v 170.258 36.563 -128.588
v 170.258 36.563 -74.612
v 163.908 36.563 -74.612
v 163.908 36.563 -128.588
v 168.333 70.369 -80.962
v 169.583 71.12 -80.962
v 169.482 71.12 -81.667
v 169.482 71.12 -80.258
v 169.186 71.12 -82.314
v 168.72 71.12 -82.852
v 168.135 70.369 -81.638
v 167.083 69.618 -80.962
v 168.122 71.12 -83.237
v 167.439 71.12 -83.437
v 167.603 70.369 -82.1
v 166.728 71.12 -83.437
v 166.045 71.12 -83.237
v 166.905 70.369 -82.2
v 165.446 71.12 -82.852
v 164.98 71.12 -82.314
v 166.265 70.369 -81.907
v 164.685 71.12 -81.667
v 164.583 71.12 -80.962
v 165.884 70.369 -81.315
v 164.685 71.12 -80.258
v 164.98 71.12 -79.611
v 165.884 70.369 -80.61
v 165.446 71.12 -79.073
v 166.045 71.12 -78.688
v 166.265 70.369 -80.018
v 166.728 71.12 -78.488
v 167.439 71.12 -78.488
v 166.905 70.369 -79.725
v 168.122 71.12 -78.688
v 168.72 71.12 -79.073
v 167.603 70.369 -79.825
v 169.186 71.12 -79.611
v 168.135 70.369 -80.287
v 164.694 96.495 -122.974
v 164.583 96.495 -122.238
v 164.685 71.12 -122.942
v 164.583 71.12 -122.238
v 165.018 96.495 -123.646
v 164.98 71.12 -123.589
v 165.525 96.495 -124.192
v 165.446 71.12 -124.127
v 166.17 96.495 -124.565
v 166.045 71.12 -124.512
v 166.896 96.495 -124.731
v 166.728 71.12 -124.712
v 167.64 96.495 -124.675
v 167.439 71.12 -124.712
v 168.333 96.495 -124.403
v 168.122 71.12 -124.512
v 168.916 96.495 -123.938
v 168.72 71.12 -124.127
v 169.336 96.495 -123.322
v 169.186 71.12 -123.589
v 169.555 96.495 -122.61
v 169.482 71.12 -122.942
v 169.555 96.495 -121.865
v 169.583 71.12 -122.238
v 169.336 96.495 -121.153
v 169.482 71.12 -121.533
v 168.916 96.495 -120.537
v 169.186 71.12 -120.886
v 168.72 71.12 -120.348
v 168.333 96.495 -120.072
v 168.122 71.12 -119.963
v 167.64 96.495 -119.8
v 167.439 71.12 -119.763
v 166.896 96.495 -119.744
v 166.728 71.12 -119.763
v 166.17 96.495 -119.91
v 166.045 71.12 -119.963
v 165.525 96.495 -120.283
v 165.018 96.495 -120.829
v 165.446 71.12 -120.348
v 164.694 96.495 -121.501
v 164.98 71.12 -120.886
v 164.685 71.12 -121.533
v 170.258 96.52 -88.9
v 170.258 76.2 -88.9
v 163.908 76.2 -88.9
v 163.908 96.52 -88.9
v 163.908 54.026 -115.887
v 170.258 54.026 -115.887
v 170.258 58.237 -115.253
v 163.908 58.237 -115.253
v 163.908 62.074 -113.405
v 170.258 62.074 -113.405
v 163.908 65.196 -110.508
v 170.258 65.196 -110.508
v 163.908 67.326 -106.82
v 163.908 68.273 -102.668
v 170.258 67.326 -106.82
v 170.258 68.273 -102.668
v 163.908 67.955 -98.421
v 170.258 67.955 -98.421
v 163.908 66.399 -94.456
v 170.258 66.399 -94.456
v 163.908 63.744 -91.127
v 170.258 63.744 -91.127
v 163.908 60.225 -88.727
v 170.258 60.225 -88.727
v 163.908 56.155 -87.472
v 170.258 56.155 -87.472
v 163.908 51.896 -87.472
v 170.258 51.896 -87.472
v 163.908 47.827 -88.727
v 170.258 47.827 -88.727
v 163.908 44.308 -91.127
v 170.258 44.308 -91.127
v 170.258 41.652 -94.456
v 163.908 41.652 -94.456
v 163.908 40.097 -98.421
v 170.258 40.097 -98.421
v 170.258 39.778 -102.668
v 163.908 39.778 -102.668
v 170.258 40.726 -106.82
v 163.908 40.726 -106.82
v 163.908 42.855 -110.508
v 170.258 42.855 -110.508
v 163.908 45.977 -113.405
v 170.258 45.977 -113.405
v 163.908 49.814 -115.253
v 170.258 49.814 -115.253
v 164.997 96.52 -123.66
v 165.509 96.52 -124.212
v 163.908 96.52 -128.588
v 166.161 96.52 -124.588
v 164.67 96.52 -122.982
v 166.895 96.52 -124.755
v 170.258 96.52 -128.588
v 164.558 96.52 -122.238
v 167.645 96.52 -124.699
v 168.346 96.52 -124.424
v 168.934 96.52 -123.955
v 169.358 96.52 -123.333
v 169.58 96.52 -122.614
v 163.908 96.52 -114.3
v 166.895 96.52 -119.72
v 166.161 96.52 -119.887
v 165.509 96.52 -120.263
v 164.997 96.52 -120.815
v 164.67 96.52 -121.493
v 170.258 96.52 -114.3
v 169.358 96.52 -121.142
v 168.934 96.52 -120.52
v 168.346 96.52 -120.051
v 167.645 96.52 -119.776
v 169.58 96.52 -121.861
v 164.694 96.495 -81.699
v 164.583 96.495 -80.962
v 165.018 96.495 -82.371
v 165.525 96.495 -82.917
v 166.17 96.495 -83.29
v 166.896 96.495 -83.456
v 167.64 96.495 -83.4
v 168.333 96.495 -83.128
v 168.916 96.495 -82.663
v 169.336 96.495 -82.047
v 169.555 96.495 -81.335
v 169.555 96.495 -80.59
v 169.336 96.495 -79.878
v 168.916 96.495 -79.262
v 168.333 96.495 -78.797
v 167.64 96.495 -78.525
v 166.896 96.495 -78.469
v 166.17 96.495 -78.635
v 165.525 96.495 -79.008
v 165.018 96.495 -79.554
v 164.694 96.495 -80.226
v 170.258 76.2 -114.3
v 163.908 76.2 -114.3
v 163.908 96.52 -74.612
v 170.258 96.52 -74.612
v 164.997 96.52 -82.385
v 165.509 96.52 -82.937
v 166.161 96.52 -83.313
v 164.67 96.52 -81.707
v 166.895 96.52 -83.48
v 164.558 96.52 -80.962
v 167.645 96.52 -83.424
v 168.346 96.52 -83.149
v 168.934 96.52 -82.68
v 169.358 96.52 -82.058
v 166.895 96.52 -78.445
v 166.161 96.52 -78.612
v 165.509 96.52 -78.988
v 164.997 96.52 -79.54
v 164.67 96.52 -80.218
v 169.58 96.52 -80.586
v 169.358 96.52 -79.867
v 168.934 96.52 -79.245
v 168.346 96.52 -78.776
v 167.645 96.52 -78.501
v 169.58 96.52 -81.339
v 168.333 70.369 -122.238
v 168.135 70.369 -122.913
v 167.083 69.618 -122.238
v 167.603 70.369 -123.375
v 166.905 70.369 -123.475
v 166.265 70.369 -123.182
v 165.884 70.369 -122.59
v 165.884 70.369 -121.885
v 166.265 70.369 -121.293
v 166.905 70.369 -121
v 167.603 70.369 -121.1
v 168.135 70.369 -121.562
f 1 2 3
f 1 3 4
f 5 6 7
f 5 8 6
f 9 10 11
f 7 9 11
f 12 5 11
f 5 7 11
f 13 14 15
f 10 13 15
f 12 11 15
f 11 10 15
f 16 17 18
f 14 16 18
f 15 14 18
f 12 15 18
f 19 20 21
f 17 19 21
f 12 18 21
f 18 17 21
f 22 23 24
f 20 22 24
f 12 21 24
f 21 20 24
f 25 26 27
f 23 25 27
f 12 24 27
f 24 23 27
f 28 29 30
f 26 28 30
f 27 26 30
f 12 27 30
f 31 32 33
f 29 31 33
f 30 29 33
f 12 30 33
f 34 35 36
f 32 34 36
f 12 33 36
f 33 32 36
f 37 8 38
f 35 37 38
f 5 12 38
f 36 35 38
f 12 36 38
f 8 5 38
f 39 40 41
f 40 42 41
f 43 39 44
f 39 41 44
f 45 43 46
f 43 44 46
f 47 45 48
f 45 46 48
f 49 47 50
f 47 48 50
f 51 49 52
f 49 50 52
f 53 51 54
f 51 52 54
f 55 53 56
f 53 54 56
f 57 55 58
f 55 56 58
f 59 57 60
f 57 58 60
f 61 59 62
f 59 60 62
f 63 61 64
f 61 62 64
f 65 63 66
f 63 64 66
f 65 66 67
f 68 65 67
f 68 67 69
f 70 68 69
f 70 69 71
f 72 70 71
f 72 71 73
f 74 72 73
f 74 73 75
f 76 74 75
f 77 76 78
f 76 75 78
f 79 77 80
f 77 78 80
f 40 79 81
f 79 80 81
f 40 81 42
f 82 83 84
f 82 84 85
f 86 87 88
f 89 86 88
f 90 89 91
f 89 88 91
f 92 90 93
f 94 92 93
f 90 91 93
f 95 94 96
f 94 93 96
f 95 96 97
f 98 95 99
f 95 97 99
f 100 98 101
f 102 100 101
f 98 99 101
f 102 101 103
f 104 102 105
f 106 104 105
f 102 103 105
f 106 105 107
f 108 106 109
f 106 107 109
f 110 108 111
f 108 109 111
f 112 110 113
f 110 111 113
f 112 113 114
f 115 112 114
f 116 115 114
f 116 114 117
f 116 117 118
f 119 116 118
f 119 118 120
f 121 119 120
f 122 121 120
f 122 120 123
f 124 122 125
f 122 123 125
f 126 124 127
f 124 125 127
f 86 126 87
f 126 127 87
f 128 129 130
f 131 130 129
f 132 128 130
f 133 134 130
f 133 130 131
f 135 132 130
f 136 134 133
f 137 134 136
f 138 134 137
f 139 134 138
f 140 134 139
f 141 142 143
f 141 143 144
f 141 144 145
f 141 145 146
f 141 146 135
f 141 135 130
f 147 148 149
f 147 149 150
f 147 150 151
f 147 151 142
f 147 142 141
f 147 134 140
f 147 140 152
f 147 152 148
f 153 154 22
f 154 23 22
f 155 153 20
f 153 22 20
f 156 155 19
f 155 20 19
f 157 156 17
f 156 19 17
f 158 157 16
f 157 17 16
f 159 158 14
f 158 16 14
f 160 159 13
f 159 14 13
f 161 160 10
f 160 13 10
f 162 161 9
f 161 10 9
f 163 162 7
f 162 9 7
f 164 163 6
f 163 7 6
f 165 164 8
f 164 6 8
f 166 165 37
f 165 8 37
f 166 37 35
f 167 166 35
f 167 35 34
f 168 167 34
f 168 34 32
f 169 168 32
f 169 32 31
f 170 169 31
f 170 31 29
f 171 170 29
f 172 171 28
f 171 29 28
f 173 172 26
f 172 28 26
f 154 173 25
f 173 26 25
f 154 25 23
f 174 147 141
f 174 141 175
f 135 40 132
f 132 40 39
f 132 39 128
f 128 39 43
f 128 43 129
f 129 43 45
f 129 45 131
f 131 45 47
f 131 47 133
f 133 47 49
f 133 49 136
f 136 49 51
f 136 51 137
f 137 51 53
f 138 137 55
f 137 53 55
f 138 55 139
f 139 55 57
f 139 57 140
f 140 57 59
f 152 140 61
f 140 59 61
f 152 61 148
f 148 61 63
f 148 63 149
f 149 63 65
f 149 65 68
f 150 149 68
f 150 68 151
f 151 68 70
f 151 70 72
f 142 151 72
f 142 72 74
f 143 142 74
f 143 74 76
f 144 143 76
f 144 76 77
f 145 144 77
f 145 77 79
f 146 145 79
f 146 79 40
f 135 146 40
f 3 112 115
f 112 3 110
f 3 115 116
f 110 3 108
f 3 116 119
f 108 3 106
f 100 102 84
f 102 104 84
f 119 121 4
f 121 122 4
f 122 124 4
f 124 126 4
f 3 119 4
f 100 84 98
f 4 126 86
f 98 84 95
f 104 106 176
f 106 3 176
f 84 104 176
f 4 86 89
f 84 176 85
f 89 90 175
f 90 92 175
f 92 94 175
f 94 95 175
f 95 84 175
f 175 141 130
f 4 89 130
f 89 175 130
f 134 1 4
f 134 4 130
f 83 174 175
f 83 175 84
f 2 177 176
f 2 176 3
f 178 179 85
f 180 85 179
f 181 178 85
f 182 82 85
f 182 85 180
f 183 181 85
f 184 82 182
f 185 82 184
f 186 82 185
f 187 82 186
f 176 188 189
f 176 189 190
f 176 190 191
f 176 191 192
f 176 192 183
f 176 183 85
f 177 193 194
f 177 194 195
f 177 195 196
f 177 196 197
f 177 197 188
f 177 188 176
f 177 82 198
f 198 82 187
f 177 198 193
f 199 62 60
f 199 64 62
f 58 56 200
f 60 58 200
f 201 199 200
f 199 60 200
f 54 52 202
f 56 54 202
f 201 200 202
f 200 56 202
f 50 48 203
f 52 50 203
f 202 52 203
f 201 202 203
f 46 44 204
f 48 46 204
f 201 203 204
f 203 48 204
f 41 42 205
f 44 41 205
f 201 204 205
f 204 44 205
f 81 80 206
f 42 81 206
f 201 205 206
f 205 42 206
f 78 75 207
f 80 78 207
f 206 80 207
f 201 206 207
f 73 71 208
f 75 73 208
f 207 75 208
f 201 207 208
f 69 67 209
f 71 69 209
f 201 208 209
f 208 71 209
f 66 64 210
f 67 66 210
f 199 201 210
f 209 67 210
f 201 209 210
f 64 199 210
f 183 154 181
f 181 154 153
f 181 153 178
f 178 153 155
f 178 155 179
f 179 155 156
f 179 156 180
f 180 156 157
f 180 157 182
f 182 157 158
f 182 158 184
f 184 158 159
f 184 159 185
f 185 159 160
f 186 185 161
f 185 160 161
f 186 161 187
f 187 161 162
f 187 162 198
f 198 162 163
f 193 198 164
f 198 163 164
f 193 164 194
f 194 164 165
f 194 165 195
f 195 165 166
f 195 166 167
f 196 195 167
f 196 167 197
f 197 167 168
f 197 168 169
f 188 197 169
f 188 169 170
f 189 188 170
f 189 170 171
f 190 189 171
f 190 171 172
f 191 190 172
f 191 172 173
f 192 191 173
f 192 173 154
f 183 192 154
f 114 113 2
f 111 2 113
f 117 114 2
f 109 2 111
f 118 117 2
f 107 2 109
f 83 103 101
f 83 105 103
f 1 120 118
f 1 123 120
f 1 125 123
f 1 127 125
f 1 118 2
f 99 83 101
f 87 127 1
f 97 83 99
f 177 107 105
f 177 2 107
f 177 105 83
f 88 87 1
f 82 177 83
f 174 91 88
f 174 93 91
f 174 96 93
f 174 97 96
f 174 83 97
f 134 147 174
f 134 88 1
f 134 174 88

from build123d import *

# Parameters (mm, degrees)
BOSS_EXTRUDE1_START             = 170.258318
SKETCH6_R                       = 14.2875
BOSS_EXTRUDE1_DEPTH             = 6.35
F_5_0MM_DOWEL_HOLE1_D           = 5
F_5_0MM_DOWEL_HOLE1_DEPTH       = 25.4
F_5_0MM_DOWEL_HOLE1_CSINK_D     = 5.05
F_5_0MM_DOWEL_HOLE1_CSINK_ANGLE = 90
F_5_0MM_DOWEL_HOLE1_TIP         = 1.502151548


with BuildPart() as part:
    # Sketch6 → Boss-Extrude1 (new body)
    with BuildSketch(Plane(origin=(0, 0, 0), x_dir=(0, 0, -1), z_dir=(1, 0, 0)).offset(BOSS_EXTRUDE1_START)):
        Polygon((74.6125, 36.5633), (128.5875, 36.5633), (128.5875, 96.52), (114.3, 96.52), (114.3, 76.2), (88.9, 76.2), (88.9, 96.52), (74.6125, 96.52), align=None)
        with Locations((101.6, 54.0258)):
            Circle(SKETCH6_R, mode=Mode.SUBTRACT)
    extrude(amount=-BOSS_EXTRUDE1_DEPTH)

    # Ø5.0mm Dowel Hole1
    with Locations(Plane(origin=(0, 96.52, 0), x_dir=(1, 0, 0), z_dir=(0, 1, 0))):
        with Locations((167.083317581, 122.2375), (167.083317581, 80.9625)):
            CounterSinkHole(F_5_0MM_DOWEL_HOLE1_D / 2, F_5_0MM_DOWEL_HOLE1_CSINK_D / 2, depth=F_5_0MM_DOWEL_HOLE1_DEPTH, counter_sink_angle=F_5_0MM_DOWEL_HOLE1_CSINK_ANGLE)
            with Locations((0, 0, -(F_5_0MM_DOWEL_HOLE1_DEPTH + F_5_0MM_DOWEL_HOLE1_TIP / 2))):  # 118° drill point
                Cone(0, F_5_0MM_DOWEL_HOLE1_D / 2, F_5_0MM_DOWEL_HOLE1_TIP, mode=Mode.SUBTRACT)


solid = part.part
